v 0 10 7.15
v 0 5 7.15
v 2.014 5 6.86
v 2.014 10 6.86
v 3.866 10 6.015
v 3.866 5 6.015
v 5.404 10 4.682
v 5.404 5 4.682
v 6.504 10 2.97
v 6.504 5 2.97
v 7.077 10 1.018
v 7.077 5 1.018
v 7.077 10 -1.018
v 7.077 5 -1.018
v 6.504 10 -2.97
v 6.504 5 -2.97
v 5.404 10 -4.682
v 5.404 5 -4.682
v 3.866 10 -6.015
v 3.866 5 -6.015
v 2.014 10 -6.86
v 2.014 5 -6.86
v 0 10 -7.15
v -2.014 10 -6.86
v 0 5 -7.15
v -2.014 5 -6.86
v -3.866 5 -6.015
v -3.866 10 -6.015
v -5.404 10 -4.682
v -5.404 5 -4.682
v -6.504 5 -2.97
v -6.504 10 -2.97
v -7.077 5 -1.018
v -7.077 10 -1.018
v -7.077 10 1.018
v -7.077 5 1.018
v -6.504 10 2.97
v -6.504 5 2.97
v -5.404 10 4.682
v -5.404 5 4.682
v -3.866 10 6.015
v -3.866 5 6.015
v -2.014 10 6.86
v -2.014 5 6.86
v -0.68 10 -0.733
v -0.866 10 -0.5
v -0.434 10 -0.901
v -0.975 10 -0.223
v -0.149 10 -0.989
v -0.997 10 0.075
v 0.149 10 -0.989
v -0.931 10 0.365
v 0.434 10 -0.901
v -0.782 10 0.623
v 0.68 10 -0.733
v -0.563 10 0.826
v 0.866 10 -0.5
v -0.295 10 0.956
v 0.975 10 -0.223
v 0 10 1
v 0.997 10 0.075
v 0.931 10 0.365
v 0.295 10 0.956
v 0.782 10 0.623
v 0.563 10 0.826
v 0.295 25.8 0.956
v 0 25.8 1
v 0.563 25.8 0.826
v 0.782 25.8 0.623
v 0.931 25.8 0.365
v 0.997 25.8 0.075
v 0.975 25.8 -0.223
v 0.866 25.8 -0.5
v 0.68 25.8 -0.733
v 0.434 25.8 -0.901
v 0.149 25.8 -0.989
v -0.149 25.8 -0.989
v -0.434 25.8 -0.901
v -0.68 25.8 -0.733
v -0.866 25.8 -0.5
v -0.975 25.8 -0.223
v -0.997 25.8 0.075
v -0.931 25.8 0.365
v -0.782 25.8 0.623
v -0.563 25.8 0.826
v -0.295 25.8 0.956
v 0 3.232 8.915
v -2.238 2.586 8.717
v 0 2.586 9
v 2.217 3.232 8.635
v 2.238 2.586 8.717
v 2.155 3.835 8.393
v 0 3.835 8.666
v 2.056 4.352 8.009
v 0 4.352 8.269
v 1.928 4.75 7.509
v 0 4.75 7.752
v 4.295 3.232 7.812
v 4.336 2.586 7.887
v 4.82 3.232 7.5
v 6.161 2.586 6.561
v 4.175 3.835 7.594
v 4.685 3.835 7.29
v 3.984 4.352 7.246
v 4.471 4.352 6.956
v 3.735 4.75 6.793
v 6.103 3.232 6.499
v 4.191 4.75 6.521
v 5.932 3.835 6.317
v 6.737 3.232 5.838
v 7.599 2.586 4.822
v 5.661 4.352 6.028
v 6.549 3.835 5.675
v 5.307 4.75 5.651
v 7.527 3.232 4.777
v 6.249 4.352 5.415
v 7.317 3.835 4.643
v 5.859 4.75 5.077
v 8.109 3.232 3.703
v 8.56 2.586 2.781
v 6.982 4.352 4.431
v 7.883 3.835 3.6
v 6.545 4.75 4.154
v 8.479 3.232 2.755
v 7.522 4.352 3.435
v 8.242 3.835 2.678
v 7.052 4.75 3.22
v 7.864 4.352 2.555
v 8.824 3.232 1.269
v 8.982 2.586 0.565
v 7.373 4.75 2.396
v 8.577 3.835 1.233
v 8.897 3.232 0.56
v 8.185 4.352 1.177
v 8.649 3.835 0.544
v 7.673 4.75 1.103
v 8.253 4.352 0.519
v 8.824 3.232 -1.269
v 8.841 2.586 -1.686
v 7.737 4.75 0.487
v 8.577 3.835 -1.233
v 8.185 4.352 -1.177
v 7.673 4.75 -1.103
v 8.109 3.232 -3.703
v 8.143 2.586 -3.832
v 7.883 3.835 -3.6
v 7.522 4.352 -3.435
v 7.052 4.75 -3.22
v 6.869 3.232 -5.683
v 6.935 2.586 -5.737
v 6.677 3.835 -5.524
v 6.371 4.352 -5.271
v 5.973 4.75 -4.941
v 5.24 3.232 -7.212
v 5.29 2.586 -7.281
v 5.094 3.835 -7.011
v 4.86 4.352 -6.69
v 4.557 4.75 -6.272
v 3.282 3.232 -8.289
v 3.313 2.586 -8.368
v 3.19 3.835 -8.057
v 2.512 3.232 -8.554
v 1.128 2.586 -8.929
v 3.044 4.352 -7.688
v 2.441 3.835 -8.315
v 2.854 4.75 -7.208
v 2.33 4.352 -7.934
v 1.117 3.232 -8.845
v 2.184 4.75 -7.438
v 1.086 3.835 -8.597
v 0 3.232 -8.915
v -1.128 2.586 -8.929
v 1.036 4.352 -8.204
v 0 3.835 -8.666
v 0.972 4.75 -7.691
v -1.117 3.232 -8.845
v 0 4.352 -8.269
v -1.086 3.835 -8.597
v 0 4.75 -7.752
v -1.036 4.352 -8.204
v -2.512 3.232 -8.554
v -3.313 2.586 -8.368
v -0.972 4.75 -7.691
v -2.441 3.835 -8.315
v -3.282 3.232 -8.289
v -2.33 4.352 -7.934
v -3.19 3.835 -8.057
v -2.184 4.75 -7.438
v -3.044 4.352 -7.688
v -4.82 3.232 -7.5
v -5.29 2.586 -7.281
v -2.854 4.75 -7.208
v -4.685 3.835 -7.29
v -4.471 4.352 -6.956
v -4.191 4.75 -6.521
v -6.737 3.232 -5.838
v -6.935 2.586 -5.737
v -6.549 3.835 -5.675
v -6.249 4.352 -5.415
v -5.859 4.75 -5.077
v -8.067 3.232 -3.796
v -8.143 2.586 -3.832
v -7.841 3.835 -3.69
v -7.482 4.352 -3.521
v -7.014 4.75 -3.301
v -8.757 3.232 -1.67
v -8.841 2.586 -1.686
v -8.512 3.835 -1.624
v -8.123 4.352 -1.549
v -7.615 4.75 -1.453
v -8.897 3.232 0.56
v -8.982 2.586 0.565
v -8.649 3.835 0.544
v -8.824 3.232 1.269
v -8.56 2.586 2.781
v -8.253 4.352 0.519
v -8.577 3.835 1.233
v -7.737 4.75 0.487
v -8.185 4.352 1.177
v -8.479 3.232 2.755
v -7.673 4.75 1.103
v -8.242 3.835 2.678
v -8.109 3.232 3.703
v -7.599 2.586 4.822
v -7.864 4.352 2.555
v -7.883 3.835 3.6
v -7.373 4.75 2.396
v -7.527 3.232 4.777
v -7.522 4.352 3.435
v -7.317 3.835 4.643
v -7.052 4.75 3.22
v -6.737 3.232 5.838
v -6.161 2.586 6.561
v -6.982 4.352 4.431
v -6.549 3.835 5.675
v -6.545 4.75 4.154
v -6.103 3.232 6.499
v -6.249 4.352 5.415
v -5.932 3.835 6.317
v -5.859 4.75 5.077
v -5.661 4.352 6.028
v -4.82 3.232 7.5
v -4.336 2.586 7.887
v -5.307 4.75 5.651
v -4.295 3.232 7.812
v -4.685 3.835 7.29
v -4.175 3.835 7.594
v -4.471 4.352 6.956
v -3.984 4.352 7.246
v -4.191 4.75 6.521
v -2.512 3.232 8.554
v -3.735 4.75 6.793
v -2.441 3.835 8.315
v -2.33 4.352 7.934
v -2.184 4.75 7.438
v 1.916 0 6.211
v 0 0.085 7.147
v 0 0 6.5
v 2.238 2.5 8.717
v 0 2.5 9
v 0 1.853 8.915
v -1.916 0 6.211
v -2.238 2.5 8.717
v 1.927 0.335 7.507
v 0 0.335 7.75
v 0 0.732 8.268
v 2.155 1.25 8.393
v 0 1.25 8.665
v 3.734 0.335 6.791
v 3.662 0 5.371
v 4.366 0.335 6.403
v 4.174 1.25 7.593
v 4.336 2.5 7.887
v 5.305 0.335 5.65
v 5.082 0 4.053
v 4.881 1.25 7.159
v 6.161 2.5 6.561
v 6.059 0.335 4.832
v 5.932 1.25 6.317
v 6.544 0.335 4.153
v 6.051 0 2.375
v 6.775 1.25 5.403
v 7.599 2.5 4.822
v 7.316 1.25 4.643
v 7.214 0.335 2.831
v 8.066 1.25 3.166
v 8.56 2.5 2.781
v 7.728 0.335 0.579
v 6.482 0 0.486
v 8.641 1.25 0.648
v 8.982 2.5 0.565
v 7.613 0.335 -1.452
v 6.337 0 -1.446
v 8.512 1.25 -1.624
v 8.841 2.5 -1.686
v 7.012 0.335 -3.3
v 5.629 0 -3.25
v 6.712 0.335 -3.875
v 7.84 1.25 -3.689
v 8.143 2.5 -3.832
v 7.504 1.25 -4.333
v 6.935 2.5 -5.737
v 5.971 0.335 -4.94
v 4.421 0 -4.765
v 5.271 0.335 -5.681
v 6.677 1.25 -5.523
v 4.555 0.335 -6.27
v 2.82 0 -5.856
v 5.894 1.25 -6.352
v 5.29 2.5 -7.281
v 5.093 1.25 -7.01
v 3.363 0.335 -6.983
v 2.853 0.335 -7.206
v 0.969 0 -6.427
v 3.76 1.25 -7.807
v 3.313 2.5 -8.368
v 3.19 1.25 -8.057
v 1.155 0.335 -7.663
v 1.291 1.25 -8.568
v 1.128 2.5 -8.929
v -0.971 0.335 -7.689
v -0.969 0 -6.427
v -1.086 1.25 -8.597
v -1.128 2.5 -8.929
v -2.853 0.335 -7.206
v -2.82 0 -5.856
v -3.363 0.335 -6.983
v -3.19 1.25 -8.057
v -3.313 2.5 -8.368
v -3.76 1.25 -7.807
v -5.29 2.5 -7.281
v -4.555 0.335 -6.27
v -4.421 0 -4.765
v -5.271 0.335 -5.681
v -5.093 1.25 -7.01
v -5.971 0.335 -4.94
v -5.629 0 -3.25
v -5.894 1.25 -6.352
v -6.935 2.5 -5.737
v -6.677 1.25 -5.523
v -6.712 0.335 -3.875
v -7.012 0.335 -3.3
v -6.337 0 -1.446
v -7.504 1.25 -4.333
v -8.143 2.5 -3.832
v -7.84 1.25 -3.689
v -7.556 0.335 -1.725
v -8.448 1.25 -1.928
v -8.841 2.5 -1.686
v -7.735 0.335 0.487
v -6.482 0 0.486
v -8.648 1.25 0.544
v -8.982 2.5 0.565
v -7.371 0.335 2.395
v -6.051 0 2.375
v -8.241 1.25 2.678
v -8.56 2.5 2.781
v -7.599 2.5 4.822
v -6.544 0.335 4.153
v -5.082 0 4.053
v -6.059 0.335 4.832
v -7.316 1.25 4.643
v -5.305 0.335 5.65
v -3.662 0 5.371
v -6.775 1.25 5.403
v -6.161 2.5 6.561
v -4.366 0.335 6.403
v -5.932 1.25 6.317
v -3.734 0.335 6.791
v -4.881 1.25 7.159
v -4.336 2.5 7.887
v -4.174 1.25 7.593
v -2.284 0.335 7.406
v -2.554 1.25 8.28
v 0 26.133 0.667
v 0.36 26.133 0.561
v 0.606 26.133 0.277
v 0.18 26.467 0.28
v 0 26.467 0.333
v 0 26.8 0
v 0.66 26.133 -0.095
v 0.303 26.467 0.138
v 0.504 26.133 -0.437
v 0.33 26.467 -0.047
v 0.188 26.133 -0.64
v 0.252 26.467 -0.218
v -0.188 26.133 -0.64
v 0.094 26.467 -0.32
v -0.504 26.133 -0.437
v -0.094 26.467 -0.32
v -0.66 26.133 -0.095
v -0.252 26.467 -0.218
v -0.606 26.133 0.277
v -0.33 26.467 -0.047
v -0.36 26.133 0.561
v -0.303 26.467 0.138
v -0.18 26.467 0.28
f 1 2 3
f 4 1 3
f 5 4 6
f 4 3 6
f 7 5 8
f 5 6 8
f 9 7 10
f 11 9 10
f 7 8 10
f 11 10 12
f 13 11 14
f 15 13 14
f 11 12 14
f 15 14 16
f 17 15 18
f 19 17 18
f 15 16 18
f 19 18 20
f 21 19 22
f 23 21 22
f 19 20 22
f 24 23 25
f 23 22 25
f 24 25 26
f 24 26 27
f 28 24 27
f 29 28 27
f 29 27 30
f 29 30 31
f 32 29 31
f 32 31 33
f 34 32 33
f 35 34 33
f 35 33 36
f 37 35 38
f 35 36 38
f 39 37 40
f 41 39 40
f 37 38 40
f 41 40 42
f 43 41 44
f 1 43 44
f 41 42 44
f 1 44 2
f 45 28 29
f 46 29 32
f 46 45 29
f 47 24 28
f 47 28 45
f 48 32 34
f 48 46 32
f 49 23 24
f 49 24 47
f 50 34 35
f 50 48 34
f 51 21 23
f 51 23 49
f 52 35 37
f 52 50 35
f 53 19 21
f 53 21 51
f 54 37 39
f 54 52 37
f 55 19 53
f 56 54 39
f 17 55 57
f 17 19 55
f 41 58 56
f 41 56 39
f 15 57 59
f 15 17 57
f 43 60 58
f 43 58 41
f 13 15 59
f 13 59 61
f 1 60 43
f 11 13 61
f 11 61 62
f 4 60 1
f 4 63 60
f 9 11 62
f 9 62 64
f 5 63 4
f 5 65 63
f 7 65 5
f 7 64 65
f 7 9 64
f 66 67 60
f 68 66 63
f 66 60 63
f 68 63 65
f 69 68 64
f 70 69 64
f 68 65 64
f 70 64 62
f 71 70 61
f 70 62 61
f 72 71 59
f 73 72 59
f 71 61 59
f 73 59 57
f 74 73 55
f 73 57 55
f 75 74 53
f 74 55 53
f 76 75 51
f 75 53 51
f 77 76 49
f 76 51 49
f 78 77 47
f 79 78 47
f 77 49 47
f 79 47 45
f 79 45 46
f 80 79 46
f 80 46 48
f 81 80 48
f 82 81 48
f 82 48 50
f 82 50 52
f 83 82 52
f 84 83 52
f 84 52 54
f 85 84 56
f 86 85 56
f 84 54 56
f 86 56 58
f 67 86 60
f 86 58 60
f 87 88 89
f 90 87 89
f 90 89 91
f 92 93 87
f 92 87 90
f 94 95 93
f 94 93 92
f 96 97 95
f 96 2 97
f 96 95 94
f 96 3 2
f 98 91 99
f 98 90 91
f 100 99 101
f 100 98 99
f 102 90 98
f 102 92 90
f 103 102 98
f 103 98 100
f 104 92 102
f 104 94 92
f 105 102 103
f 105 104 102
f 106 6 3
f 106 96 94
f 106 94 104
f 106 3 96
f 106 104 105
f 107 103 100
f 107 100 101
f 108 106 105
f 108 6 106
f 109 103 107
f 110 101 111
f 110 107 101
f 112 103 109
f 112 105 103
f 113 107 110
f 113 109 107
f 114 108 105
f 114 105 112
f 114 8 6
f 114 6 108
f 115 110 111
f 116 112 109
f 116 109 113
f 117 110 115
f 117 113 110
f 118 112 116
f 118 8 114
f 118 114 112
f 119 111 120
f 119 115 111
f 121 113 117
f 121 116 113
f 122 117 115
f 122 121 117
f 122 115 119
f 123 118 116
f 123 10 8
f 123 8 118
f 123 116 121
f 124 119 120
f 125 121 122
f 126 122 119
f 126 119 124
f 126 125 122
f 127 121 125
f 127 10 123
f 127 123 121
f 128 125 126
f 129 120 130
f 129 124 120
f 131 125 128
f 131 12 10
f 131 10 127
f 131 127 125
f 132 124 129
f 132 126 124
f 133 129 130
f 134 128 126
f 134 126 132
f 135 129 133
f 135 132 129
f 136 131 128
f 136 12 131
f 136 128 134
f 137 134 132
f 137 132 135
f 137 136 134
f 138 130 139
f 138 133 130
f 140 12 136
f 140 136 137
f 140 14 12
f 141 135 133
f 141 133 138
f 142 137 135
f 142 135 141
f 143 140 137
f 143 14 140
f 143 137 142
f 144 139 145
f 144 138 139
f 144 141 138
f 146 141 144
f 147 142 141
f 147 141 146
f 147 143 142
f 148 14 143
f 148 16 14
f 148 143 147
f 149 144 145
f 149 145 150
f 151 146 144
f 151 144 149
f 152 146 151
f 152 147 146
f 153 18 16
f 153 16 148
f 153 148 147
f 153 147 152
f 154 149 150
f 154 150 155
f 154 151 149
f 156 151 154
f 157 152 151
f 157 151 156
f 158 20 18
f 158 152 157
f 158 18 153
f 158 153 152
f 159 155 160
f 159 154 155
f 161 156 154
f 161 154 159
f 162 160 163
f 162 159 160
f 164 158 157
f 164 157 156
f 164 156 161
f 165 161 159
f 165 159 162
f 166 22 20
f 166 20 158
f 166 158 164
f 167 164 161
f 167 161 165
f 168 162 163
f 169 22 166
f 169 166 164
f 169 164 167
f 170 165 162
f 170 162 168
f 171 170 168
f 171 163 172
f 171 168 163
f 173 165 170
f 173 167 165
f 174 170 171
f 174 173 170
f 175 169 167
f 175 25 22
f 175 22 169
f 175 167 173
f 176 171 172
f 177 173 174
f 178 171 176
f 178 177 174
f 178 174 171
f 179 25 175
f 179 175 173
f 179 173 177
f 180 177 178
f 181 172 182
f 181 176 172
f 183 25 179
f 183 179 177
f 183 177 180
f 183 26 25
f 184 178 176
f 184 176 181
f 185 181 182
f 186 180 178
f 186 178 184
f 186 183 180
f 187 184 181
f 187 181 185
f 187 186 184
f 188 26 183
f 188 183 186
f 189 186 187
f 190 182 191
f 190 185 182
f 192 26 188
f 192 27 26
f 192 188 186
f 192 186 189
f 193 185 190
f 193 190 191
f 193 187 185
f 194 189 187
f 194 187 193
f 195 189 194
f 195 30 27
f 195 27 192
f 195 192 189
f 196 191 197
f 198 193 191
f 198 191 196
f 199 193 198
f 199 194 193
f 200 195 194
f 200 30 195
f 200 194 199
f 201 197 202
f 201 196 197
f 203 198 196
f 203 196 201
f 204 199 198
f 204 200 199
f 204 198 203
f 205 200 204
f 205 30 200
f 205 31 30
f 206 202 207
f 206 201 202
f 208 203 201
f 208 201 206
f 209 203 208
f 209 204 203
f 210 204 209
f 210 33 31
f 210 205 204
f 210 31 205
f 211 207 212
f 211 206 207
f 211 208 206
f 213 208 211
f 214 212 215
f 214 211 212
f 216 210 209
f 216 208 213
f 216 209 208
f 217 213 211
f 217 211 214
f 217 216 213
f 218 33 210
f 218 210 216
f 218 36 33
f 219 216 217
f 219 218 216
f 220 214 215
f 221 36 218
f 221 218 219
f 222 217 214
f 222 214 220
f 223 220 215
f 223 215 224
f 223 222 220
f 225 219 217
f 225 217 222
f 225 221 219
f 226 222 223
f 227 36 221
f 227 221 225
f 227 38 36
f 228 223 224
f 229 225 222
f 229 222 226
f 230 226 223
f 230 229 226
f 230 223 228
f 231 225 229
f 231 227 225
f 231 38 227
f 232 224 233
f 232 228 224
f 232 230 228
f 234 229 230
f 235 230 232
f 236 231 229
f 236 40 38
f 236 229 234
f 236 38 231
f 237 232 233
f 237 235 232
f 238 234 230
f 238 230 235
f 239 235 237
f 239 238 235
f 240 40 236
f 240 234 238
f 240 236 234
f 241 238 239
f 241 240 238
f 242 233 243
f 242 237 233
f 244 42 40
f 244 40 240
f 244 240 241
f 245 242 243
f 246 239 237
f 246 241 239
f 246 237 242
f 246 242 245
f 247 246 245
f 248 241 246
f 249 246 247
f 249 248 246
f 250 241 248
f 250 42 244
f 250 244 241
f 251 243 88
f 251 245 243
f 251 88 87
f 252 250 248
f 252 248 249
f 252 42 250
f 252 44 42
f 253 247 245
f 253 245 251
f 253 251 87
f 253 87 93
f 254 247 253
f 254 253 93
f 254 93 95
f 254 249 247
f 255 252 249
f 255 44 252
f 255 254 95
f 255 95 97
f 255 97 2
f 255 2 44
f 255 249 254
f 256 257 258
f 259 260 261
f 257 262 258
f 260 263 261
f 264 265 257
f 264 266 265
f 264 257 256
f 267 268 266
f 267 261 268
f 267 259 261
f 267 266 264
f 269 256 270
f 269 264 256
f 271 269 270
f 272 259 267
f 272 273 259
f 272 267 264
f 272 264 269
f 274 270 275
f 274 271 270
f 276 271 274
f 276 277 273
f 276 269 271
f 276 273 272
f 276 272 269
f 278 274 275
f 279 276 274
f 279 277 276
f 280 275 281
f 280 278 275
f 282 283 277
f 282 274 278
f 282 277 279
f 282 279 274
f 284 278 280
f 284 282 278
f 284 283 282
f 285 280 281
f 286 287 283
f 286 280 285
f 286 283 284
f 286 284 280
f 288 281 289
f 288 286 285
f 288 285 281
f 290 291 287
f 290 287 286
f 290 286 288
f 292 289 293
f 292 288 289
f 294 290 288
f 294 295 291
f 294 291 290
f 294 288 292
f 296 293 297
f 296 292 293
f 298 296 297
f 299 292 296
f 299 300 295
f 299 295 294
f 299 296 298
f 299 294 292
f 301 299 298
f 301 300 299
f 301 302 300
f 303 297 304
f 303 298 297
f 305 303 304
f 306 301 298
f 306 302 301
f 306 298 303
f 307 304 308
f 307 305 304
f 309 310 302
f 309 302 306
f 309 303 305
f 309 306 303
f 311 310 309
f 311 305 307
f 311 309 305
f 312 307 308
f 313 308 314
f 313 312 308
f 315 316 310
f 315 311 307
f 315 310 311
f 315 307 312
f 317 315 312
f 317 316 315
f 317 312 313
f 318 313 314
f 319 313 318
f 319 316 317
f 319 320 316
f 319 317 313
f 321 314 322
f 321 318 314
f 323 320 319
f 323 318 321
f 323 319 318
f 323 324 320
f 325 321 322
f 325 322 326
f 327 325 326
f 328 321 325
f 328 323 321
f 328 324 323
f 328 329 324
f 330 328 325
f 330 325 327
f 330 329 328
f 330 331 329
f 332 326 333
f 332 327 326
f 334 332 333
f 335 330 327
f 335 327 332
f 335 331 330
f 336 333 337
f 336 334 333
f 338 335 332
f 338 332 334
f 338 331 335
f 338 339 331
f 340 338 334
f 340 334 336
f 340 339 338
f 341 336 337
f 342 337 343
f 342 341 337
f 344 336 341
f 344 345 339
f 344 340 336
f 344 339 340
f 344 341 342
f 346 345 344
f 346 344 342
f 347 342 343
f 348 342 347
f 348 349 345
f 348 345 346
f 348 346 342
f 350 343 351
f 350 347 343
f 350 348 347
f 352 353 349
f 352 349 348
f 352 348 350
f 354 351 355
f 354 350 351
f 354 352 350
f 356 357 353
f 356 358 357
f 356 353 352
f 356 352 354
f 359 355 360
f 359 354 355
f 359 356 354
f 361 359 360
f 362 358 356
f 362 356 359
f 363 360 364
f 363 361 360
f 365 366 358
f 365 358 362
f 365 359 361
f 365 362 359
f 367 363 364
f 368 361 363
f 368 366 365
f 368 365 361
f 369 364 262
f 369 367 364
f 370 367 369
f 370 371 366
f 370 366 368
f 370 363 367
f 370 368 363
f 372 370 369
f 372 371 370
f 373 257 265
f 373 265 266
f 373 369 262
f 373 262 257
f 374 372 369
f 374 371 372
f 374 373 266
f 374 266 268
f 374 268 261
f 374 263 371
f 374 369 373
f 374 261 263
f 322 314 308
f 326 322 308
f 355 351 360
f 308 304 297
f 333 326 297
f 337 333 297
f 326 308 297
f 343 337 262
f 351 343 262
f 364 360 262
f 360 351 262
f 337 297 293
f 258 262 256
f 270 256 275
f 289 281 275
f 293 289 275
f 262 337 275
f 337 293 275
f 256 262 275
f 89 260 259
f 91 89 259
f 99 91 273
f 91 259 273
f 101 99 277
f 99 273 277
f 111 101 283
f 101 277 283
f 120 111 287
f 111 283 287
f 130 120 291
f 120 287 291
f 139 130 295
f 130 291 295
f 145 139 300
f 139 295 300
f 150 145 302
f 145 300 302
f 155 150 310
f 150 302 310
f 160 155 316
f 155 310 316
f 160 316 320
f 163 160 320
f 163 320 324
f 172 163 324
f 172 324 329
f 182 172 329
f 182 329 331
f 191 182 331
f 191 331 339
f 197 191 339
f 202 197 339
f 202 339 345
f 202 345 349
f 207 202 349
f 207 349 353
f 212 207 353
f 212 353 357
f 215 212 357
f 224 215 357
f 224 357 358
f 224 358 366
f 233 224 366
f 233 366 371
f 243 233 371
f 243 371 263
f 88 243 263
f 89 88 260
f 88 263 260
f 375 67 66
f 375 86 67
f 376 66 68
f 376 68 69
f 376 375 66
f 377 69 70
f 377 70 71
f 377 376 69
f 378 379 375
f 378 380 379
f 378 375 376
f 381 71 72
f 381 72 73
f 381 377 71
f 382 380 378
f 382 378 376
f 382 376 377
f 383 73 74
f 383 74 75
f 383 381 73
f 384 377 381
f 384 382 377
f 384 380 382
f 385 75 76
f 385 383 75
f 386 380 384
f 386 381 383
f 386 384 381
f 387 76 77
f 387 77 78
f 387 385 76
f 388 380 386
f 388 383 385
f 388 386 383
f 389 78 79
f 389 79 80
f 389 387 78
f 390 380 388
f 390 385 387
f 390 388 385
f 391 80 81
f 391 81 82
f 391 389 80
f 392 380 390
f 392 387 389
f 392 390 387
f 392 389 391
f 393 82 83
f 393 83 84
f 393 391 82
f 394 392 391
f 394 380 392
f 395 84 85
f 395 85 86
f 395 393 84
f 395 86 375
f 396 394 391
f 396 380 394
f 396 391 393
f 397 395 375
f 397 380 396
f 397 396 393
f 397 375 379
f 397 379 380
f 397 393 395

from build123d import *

# Parameters (mm, degrees)
SKETCH1_R           = 9
BOSS_EXTRUDE1_DEPTH = 5
SKETCH2_R           = 7.15
BOSS_EXTRUDE2_DEPTH = 5
SKETCH3_R           = 1
BOSS_EXTRUDE3_DEPTH = 16.8
FILLET1_R           = 2.5
CHAMFER1_SIZE       = 1


with BuildPart() as part:
    # Sketch1 → Boss-Extrude1 (new body)
    with BuildSketch(Plane(origin=(0, 0, 0), x_dir=(1, 0, 0), z_dir=(0, 1, 0))):
        with Locations(Location((0, 0, 0), (0, 0, 270))):
            Circle(SKETCH1_R)
    extrude(amount=BOSS_EXTRUDE1_DEPTH)

    # Sketch2 → Boss-Extrude2 (add)
    with BuildSketch(Plane(origin=(0, 5, 0), x_dir=(1, 0, 0), z_dir=(0, 1, 0))):
        with Locations(Location((0, 0, 0), (0, 0, 270))):
            Circle(SKETCH2_R)
    extrude(amount=BOSS_EXTRUDE2_DEPTH)

    # Sketch3 → Boss-Extrude3 (add)
    with BuildSketch(Plane(origin=(0, 10, 0), x_dir=(1, 0, 0), z_dir=(0, 1, 0))):
        with Locations(Location((0, 0, 0), (0, 0, 270))):
            Circle(SKETCH3_R)
    extrude(amount=BOSS_EXTRUDE3_DEPTH)

    # Fillet1
    # the kernel refuses this fillet: 2.5 mm, written as the material it takes off along each edge
    with BuildSketch(Plane(origin=(0, 0, 0), x_dir=(0, 0, 1), z_dir=(-1, 0, 0))) as fillet1_piece_1:
        with BuildLine():
            CenterArc((9 - FILLET1_R, FILLET1_R), FILLET1_R, 270, 90)
            Line((9 - FILLET1_R, 0), (9 - FILLET1_R, -FILLET1_R * 0.02))
            Line((9 - FILLET1_R, -FILLET1_R * 0.02), (9 + FILLET1_R * 0.02, -FILLET1_R * 0.02))
            Line((9 + FILLET1_R * 0.02, -FILLET1_R * 0.02), (9 + FILLET1_R * 0.02, FILLET1_R))
            Line((9 + FILLET1_R * 0.02, FILLET1_R), (9, FILLET1_R))
        make_face()
    revolve(axis=Axis((0, 0, 0), (0, 1, 0)), mode=Mode.SUBTRACT)
    with BuildSketch(Plane(origin=(0, 5, 0), x_dir=(0, 0, 1), z_dir=(-1, 0, 0))) as fillet1_piece_2:
        with BuildLine():
            CenterArc((6.5, -2.414021541), FILLET1_R, 0, 74.929937855)
            Line((7.15, 0), (7.163, 0.048280431))
            ThreePointArc((7.163, 0.048280431), (8.075, 0.05), (9, 0.05))
            Line((9, 0.05), (9.05, 0))
            Line((9.05, 0), (9.05, -2.414021541))
            Line((9.05, -2.414021541), (9, -2.414021541))
        make_face()
    revolve(axis=Axis((0, 5, 0), (0, 1, 0)), mode=Mode.SUBTRACT)

    # Chamfer1
    chamfer1_edges = [part.edges().sort_by_distance(p)[0] for p in [
        (0, 26.8, -1),
    ]]
    chamfer(chamfer1_edges, length=CHAMFER1_SIZE)


solid = part.part
